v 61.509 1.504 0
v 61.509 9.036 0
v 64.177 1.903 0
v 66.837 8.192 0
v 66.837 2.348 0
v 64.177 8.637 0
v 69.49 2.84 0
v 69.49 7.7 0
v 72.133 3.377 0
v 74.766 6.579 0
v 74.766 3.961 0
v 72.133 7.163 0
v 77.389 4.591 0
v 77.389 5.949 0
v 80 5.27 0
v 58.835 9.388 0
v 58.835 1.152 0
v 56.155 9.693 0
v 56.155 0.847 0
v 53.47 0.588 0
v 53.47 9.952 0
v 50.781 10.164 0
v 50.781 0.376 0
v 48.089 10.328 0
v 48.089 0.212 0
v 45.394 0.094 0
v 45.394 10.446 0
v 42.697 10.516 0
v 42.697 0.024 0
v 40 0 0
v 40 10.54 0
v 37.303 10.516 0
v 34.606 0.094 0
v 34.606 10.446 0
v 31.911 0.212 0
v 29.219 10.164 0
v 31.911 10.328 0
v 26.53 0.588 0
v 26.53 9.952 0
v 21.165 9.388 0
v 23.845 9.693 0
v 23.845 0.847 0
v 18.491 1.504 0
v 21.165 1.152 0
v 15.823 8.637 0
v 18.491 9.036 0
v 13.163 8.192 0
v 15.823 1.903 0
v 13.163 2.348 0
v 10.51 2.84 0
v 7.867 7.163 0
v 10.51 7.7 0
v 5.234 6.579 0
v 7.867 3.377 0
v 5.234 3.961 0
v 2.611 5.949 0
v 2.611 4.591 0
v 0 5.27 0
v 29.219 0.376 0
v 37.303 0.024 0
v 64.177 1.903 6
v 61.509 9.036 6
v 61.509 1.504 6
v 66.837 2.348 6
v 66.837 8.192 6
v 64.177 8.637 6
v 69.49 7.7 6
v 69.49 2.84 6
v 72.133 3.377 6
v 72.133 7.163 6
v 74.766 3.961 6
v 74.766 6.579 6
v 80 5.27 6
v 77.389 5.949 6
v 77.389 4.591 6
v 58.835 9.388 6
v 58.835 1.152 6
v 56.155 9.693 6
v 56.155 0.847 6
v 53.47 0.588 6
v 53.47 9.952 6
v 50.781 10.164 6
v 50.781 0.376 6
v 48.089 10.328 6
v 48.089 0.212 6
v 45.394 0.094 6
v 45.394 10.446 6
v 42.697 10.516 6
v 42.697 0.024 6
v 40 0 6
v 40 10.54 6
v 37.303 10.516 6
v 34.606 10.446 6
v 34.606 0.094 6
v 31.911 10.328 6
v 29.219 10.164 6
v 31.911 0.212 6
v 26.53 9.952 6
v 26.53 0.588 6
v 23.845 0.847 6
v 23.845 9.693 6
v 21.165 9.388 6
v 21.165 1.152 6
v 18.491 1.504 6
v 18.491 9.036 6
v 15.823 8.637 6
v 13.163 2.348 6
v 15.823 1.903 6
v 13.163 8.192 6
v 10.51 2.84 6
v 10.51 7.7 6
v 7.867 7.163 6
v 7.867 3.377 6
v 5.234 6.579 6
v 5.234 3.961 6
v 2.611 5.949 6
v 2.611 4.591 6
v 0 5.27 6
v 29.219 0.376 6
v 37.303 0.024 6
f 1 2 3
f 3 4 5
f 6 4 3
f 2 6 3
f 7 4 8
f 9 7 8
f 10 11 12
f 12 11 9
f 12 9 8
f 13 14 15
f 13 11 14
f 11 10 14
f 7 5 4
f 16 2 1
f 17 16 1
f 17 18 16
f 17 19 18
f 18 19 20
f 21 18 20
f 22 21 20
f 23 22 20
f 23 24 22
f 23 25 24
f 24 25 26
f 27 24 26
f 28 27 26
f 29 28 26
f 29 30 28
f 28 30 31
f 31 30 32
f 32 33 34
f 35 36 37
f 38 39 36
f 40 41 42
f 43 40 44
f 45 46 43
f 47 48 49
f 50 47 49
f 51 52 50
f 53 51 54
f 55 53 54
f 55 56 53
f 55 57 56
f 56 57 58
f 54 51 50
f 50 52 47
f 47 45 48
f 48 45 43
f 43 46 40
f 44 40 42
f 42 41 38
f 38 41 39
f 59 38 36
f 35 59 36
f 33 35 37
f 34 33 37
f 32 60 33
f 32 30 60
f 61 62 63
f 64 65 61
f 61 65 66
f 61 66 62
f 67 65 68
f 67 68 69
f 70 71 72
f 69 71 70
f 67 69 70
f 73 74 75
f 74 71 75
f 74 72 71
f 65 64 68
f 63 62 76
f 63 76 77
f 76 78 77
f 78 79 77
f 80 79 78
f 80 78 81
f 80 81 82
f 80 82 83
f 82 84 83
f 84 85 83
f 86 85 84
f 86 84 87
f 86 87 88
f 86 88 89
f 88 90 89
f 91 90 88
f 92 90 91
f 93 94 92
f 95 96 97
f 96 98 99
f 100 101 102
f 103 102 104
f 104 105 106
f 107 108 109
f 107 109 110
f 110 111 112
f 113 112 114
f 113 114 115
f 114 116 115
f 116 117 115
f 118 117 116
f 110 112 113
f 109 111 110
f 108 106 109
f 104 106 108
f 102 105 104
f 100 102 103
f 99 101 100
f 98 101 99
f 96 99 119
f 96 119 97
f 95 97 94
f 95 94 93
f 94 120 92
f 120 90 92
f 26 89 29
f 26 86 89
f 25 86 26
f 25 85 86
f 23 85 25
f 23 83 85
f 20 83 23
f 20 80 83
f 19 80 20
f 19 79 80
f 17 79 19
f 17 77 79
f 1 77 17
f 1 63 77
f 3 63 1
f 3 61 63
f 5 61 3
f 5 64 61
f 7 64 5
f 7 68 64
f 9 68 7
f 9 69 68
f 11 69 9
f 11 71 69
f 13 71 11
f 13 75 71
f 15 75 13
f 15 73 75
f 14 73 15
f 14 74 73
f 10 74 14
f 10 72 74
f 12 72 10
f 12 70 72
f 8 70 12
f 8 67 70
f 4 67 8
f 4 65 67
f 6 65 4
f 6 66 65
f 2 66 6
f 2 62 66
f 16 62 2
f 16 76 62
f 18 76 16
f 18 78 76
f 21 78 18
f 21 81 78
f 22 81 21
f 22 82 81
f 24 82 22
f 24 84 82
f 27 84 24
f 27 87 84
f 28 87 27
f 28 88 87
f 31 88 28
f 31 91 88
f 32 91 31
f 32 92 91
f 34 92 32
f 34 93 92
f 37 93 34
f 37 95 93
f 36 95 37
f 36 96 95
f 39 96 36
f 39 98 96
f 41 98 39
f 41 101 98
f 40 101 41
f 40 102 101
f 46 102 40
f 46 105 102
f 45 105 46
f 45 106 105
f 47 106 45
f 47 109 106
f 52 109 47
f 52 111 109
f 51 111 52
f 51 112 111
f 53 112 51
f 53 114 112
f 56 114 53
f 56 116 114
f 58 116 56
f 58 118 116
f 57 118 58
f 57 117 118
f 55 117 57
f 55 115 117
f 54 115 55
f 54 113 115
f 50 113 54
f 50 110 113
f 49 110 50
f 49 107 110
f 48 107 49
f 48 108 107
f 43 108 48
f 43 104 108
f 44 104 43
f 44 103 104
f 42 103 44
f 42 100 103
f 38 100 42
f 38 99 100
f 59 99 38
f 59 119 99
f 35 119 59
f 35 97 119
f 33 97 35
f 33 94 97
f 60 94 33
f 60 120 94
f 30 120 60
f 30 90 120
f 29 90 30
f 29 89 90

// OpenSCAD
$fn = 32;

// ----------------------------------------------------------------------
// Arc profile plate: lens, 60 points
// ----------------------------------------------------------------------

// --- parameters (mm) ---
lens_chord = 80;          // chord length of the lens, X
arc_r = 154.55;           // radius of both arcs
arc_angle = 30;           // angle of each arc, degrees
sagitta = 5.27;           // bulge of each arc (half the lens height)
arc_step = 1;             // sampling step of the arcs, degrees
plate_t = 6;              // plate thickness, Z

bbox_y = 2 * sagitta;  // full lens height

profile = [[80, 5.27], [77.389, 5.949], [74.766, 6.579], [72.133, 7.163], [69.49, 7.7], [66.837, 8.192], [64.177, 8.637], [61.509, 9.036], [58.835, 9.388], [56.155, 9.693], [53.47, 9.952], [50.781, 10.164], [48.089, 10.328], [45.394, 10.446], [42.697, 10.516], [40, 10.54], [37.303, 10.516], [34.606, 10.446], [31.911, 10.328], [29.219, 10.164], [26.53, 9.952], [23.845, 9.693], [21.165, 9.388], [18.491, 9.036], [15.823, 8.637], [13.163, 8.192], [10.51, 7.7], [7.867, 7.163], [5.234, 6.579], [2.611, 5.949], [0, 5.27], [2.611, 4.591], [5.234, 3.961], [7.867, 3.377], [10.51, 2.84], [13.163, 2.348], [15.823, 1.903], [18.491, 1.504], [21.165, 1.152], [23.845, 0.847], [26.53, 0.588], [29.219, 0.376], [31.911, 0.212], [34.606, 0.094], [37.303, 0.024], [40, 0], [42.697, 0.024], [45.394, 0.094], [48.089, 0.212], [50.781, 0.376], [53.47, 0.588], [56.155, 0.847], [58.835, 1.152], [61.509, 1.504], [64.177, 1.903], [66.837, 2.348], [69.49, 2.84], [72.133, 3.377], [74.766, 3.961], [77.389, 4.591]];  // primary outline, 60 points, counter clockwise

// --- the one profile operation ---
linear_extrude(height = plate_t) polygon(points = profile);
